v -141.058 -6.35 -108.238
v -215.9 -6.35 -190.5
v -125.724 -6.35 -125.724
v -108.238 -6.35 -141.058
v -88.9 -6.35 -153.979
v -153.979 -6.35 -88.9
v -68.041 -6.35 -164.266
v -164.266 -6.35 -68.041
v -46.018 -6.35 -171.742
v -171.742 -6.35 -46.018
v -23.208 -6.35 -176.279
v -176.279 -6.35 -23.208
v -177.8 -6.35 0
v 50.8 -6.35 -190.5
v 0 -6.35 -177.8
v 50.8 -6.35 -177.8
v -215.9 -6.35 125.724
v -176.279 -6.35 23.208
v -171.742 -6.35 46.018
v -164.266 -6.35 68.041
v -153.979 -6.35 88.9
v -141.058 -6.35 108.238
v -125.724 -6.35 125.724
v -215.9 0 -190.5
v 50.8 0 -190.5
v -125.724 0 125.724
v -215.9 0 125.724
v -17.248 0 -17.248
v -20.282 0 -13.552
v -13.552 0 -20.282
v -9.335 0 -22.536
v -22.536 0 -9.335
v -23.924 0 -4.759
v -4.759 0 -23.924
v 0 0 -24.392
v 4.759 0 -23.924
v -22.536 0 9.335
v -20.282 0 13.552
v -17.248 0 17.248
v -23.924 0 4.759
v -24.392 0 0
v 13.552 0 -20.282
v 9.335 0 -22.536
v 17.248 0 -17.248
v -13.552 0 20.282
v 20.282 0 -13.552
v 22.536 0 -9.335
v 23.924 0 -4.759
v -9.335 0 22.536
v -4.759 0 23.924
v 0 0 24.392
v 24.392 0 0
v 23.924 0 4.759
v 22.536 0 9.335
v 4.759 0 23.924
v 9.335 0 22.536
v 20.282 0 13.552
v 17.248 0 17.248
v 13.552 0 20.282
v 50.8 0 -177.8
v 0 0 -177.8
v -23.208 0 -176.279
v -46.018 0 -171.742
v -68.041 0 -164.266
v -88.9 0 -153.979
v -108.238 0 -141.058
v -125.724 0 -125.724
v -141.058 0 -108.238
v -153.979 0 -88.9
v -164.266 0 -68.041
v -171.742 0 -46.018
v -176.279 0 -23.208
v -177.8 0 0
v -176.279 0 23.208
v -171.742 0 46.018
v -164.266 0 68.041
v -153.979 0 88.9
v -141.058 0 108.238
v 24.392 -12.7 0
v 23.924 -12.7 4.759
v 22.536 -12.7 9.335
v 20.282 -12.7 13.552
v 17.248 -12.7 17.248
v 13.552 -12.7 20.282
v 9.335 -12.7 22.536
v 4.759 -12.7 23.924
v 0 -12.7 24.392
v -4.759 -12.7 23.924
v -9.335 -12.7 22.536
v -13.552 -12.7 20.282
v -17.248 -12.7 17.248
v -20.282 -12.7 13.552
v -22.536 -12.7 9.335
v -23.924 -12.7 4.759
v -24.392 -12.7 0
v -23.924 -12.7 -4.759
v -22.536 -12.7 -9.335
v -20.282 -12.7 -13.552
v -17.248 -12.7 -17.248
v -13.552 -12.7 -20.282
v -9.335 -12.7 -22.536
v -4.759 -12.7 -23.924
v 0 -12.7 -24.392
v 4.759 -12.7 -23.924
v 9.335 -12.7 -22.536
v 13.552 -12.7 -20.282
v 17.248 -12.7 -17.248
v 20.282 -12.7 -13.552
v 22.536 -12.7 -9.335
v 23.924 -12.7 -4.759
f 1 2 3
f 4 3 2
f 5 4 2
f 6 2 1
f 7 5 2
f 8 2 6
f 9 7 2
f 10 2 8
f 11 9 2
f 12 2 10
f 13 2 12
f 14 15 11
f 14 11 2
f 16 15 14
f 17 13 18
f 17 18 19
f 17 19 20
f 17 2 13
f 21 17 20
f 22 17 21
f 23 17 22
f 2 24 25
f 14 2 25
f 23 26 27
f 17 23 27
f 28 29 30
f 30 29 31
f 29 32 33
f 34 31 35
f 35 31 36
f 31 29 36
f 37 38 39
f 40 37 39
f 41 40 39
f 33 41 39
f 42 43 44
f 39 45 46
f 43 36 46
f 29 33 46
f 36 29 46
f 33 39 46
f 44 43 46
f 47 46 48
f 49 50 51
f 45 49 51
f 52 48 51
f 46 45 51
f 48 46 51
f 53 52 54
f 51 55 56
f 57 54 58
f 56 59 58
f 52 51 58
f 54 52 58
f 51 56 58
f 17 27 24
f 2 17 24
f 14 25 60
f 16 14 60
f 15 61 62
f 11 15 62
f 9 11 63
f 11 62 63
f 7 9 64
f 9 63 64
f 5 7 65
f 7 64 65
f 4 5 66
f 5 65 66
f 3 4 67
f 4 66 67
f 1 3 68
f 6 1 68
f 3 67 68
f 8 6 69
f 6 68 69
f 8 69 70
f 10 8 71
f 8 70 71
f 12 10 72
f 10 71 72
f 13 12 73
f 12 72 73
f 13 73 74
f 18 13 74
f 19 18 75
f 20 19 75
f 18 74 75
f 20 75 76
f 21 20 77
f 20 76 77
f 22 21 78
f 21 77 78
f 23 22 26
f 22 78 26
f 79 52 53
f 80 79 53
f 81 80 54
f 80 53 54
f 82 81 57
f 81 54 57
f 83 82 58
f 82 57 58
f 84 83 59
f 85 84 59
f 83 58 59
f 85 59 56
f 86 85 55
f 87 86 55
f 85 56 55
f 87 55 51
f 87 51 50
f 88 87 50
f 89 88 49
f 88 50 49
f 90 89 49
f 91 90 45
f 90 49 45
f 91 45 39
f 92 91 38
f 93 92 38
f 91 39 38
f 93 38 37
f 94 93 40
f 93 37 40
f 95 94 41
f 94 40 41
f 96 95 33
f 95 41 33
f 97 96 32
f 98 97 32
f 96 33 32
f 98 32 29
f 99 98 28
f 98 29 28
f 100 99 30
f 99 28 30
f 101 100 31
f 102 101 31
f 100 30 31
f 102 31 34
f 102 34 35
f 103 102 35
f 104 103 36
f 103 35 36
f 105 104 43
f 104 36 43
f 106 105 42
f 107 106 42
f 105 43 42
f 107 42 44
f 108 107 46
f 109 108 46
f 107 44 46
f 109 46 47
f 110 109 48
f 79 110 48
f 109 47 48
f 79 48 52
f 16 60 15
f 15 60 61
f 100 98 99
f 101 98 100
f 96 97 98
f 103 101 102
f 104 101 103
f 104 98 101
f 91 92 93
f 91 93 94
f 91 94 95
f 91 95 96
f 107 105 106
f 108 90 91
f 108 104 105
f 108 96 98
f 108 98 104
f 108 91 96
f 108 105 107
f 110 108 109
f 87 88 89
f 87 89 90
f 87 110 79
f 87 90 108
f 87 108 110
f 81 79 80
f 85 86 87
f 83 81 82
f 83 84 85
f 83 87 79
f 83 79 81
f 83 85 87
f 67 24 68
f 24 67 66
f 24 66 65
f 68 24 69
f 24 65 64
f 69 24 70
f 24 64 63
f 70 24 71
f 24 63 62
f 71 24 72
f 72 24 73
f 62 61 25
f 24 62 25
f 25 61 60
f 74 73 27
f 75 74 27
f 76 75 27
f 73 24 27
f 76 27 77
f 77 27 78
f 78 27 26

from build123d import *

# Parameters (mm, degrees)
F1_DEPTH = 6.35
F2_R     = 24.392404
F3_DEPTH = 12.7


with BuildPart() as f1:
    # F0 (on Front) → F1 (new body)
    with BuildSketch(Plane.XZ):
        with BuildLine():
            ThreePointArc((-177.8, 0), (-164.265781, 68.041114), (-125.723586, 125.723586))
            Line((-125.723586, 125.723586), (-215.9, 125.723586))
            Line((-215.9, 125.723586), (-215.9, 0))
            Line((-215.9, 0), (-177.8, 0))
        make_face()
        with BuildLine():
            Line((50.8, -177.8), (0, -177.8))
            ThreePointArc((0, -177.8), (-125.723586, -125.723586), (-177.8, 0))
            Line((-177.8, 0), (-215.9, 0))
            Line((-215.9, 0), (-215.9, -190.5))
            Line((-215.9, -190.5), (50.8, -190.5))
            Line((50.8, -190.5), (50.8, -177.8))
        make_face()
    extrude(amount=F1_DEPTH)


with BuildPart() as f3:
    # F2 (on Front) → F3 (new body)
    with BuildSketch(Plane.XZ):
        Circle(F2_R)
    extrude(amount=F3_DEPTH)


solid = Compound([f1.part, f3.part])
